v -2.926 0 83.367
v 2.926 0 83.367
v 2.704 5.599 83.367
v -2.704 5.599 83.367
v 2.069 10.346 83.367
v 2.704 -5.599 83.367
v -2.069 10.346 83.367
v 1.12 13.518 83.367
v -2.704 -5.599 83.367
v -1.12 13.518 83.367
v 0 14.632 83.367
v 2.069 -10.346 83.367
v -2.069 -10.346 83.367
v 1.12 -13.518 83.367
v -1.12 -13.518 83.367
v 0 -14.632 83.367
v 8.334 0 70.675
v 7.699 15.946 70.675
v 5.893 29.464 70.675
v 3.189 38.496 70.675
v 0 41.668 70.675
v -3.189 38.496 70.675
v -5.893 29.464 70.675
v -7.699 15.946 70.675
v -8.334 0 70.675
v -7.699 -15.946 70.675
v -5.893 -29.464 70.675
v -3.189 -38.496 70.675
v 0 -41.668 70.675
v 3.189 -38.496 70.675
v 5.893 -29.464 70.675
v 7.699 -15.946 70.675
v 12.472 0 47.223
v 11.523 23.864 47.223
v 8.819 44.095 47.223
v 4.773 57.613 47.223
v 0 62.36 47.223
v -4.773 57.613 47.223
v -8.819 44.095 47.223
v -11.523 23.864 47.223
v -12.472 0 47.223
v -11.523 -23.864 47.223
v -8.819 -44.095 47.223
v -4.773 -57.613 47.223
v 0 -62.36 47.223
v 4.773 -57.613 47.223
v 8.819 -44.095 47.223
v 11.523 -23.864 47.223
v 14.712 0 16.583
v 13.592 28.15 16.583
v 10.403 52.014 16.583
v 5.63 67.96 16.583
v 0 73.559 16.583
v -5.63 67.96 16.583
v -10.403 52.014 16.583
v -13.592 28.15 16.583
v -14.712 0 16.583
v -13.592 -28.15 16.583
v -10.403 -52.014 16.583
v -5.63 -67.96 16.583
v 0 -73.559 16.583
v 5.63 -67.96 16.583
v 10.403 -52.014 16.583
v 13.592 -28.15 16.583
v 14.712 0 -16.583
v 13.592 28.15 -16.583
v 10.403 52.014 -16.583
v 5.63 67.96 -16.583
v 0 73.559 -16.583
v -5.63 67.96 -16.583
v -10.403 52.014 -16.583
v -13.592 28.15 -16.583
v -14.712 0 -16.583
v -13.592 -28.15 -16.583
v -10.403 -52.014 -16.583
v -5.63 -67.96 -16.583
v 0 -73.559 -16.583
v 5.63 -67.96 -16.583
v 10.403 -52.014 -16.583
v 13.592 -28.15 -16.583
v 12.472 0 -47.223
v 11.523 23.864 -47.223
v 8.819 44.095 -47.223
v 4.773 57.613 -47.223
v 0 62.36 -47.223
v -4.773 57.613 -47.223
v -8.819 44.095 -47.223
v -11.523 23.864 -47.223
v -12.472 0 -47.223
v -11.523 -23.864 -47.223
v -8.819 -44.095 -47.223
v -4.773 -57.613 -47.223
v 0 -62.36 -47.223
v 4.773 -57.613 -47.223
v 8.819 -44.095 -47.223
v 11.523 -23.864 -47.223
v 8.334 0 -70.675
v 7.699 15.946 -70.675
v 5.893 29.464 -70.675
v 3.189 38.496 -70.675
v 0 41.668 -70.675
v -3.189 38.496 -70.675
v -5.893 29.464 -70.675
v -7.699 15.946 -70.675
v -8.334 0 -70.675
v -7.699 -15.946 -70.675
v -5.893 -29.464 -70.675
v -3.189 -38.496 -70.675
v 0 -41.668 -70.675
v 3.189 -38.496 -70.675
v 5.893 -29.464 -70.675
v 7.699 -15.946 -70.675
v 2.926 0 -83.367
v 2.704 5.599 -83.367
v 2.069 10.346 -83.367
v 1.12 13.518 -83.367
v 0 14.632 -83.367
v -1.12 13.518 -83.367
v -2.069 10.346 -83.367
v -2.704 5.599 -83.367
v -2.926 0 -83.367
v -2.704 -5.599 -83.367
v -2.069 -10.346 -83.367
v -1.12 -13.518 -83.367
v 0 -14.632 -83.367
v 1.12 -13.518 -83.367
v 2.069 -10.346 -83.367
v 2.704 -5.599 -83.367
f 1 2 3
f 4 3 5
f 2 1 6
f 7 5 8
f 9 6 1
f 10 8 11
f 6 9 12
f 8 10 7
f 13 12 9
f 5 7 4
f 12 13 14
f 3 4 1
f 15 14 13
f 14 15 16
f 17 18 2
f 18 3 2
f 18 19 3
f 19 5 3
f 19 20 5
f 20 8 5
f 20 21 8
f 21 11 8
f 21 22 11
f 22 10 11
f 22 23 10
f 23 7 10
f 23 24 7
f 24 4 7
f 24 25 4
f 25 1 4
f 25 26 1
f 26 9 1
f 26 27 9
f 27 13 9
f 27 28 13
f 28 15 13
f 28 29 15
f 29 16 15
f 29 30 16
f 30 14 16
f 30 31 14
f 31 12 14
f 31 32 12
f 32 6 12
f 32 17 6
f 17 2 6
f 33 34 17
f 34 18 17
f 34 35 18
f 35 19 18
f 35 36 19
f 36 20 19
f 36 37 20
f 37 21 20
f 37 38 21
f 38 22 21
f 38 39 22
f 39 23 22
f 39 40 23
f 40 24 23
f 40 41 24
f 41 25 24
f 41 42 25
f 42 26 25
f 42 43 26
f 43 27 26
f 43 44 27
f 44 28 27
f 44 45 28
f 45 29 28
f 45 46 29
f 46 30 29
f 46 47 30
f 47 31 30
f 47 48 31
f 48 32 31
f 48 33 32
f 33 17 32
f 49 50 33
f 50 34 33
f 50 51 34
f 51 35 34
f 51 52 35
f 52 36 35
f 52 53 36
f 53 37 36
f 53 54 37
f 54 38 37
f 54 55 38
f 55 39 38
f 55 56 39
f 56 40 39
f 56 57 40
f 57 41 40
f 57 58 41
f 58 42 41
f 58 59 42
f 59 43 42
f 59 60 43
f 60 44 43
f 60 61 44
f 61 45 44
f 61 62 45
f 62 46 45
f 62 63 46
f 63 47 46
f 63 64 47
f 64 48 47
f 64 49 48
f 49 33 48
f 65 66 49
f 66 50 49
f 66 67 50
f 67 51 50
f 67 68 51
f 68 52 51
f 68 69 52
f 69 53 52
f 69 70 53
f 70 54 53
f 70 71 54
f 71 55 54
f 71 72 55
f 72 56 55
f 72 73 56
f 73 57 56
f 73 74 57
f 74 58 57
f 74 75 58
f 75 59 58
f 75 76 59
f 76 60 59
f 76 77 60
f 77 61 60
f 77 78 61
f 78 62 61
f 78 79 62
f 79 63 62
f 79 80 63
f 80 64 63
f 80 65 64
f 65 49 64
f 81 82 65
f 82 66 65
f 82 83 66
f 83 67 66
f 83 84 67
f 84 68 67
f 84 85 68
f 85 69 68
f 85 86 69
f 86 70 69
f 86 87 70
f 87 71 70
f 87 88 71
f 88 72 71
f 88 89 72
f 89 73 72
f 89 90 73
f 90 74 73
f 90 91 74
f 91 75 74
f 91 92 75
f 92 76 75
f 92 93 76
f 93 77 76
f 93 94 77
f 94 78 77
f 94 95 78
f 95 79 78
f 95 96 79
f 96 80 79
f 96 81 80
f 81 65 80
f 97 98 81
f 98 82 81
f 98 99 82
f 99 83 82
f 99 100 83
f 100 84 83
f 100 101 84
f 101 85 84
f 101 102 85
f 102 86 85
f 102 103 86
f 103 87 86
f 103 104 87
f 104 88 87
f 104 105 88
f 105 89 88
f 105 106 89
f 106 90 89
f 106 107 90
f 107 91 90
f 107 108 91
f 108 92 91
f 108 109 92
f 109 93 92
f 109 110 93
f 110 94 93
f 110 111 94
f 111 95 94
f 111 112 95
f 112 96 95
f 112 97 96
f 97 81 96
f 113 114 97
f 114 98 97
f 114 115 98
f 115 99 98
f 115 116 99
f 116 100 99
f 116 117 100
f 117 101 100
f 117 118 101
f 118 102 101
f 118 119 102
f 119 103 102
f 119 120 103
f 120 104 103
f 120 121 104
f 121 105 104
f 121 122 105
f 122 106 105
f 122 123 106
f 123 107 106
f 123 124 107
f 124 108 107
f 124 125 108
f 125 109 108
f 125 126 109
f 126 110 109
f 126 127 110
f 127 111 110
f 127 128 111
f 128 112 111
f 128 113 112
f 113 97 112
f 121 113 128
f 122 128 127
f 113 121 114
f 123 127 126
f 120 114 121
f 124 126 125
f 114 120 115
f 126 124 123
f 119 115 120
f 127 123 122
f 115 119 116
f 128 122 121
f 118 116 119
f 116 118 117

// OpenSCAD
// Generated by SolidPython 1.0.1 on 2020-07-29 00:46:45


scale(v = [3, 15, 17]) {
	sphere(r = 5);
}
/***********************************************
*********      SolidPython code:      **********
************************************************
 
# import packages: SolidPython
from solid import *
from solid.utils import *
from itertools import chain, combinations, permutations


class Resize:

    def __init__(self, scad_file):
        self.scad_file = scad_file
        #self.scad_file = import_scad(scad_file)
        # cone/cylinder param:
        self.r1 = 0
        self.r2 = 0
        self.h = 0
        # rectangular prism param:
        self.w = 0
        self.l = 0
        # ellipse param:
        self.r = 0

    # import OpenScad code (file name corresponds to shape)


    # classify shape + parameters
    def assign(self, param1, param2, param3):
        if self.scad_file == 'cone.scad':
            self.r1 = param1
            self.r2 = param2
            self.h = param3
        elif self.scad_file == 'cylinder.scad':
            self.r1 = param1
            self.r2 = param2
            self.h = param3
        elif self.scad_file == 'rectangularPrism.scad':
            self.h = param1
            self.l = param2
            self.w = param3
        else:
            self.r = param1
            self.h = param2

    # resize parameters
    def iterate(self):
        x = range(3, 20, 2)
        i = 1
        if self.scad_file == 'cone.scad':
            tempList = list(permutations(x, 2))
            for temp in tempList:
                param1 = temp[0]
                param2 = temp[1]
                filepath = 'produced_scad_files/' + 'cone' + str(param1) + '_' + str(param2) + '_' + '.scad'
                scad_render_to_file(cylinder(h=param1, r1=param2, r2=0), filepath)

        elif self.scad_file == 'cylinder.scad':
            tempList = list(permutations(x, 3))
            for temp in tempList:
                param1 = temp[0]
                param2 = temp[1]
                filepath = 'produced_scad_files/' + 'cylinder' + str(param1) + '_' + str(param2) + '_' + '.scad'
                scad_render_to_file(cylinder(h=param1, r1=param2, r2=param2), filepath)

        elif self.scad_file == 'rectangularPrism.scad':
            tempList = list(permutations(x, 3))
            for temp in tempList:
                param1 = temp[0]
                param2 = temp[1]
                param3 = temp[2]
                filepath = 'produced_scad_files/' + 'rectangularPrism' + str(param1) + '_' + str(param2) + '_' + str(
                    param3) + '.scad'
                scad_render_to_file(cube(size=(param1, param2, param3)), filepath)

        elif self.scad_file == 'ellipse.scad':
            tempList = list(permutations(x, 4))
            for temp in tempList:
                param1 = temp[0]
                param2 = temp[1]
                param3 = temp[2]
                param4 = temp[3]
                filepath = 'produced_scad_files/' + 'ellipse' + str(param1) + '_' + str(param2) + '_' + str(param3) + '_' + str(param4) + '.scad'
                scad_render_to_file(scale([param1, param2, param3])(sphere(r=param4)), filepath)

    def render_to_scadfile(self):
        scad_render_to_file(scad, 'example.scad') 
 
************************************************/
